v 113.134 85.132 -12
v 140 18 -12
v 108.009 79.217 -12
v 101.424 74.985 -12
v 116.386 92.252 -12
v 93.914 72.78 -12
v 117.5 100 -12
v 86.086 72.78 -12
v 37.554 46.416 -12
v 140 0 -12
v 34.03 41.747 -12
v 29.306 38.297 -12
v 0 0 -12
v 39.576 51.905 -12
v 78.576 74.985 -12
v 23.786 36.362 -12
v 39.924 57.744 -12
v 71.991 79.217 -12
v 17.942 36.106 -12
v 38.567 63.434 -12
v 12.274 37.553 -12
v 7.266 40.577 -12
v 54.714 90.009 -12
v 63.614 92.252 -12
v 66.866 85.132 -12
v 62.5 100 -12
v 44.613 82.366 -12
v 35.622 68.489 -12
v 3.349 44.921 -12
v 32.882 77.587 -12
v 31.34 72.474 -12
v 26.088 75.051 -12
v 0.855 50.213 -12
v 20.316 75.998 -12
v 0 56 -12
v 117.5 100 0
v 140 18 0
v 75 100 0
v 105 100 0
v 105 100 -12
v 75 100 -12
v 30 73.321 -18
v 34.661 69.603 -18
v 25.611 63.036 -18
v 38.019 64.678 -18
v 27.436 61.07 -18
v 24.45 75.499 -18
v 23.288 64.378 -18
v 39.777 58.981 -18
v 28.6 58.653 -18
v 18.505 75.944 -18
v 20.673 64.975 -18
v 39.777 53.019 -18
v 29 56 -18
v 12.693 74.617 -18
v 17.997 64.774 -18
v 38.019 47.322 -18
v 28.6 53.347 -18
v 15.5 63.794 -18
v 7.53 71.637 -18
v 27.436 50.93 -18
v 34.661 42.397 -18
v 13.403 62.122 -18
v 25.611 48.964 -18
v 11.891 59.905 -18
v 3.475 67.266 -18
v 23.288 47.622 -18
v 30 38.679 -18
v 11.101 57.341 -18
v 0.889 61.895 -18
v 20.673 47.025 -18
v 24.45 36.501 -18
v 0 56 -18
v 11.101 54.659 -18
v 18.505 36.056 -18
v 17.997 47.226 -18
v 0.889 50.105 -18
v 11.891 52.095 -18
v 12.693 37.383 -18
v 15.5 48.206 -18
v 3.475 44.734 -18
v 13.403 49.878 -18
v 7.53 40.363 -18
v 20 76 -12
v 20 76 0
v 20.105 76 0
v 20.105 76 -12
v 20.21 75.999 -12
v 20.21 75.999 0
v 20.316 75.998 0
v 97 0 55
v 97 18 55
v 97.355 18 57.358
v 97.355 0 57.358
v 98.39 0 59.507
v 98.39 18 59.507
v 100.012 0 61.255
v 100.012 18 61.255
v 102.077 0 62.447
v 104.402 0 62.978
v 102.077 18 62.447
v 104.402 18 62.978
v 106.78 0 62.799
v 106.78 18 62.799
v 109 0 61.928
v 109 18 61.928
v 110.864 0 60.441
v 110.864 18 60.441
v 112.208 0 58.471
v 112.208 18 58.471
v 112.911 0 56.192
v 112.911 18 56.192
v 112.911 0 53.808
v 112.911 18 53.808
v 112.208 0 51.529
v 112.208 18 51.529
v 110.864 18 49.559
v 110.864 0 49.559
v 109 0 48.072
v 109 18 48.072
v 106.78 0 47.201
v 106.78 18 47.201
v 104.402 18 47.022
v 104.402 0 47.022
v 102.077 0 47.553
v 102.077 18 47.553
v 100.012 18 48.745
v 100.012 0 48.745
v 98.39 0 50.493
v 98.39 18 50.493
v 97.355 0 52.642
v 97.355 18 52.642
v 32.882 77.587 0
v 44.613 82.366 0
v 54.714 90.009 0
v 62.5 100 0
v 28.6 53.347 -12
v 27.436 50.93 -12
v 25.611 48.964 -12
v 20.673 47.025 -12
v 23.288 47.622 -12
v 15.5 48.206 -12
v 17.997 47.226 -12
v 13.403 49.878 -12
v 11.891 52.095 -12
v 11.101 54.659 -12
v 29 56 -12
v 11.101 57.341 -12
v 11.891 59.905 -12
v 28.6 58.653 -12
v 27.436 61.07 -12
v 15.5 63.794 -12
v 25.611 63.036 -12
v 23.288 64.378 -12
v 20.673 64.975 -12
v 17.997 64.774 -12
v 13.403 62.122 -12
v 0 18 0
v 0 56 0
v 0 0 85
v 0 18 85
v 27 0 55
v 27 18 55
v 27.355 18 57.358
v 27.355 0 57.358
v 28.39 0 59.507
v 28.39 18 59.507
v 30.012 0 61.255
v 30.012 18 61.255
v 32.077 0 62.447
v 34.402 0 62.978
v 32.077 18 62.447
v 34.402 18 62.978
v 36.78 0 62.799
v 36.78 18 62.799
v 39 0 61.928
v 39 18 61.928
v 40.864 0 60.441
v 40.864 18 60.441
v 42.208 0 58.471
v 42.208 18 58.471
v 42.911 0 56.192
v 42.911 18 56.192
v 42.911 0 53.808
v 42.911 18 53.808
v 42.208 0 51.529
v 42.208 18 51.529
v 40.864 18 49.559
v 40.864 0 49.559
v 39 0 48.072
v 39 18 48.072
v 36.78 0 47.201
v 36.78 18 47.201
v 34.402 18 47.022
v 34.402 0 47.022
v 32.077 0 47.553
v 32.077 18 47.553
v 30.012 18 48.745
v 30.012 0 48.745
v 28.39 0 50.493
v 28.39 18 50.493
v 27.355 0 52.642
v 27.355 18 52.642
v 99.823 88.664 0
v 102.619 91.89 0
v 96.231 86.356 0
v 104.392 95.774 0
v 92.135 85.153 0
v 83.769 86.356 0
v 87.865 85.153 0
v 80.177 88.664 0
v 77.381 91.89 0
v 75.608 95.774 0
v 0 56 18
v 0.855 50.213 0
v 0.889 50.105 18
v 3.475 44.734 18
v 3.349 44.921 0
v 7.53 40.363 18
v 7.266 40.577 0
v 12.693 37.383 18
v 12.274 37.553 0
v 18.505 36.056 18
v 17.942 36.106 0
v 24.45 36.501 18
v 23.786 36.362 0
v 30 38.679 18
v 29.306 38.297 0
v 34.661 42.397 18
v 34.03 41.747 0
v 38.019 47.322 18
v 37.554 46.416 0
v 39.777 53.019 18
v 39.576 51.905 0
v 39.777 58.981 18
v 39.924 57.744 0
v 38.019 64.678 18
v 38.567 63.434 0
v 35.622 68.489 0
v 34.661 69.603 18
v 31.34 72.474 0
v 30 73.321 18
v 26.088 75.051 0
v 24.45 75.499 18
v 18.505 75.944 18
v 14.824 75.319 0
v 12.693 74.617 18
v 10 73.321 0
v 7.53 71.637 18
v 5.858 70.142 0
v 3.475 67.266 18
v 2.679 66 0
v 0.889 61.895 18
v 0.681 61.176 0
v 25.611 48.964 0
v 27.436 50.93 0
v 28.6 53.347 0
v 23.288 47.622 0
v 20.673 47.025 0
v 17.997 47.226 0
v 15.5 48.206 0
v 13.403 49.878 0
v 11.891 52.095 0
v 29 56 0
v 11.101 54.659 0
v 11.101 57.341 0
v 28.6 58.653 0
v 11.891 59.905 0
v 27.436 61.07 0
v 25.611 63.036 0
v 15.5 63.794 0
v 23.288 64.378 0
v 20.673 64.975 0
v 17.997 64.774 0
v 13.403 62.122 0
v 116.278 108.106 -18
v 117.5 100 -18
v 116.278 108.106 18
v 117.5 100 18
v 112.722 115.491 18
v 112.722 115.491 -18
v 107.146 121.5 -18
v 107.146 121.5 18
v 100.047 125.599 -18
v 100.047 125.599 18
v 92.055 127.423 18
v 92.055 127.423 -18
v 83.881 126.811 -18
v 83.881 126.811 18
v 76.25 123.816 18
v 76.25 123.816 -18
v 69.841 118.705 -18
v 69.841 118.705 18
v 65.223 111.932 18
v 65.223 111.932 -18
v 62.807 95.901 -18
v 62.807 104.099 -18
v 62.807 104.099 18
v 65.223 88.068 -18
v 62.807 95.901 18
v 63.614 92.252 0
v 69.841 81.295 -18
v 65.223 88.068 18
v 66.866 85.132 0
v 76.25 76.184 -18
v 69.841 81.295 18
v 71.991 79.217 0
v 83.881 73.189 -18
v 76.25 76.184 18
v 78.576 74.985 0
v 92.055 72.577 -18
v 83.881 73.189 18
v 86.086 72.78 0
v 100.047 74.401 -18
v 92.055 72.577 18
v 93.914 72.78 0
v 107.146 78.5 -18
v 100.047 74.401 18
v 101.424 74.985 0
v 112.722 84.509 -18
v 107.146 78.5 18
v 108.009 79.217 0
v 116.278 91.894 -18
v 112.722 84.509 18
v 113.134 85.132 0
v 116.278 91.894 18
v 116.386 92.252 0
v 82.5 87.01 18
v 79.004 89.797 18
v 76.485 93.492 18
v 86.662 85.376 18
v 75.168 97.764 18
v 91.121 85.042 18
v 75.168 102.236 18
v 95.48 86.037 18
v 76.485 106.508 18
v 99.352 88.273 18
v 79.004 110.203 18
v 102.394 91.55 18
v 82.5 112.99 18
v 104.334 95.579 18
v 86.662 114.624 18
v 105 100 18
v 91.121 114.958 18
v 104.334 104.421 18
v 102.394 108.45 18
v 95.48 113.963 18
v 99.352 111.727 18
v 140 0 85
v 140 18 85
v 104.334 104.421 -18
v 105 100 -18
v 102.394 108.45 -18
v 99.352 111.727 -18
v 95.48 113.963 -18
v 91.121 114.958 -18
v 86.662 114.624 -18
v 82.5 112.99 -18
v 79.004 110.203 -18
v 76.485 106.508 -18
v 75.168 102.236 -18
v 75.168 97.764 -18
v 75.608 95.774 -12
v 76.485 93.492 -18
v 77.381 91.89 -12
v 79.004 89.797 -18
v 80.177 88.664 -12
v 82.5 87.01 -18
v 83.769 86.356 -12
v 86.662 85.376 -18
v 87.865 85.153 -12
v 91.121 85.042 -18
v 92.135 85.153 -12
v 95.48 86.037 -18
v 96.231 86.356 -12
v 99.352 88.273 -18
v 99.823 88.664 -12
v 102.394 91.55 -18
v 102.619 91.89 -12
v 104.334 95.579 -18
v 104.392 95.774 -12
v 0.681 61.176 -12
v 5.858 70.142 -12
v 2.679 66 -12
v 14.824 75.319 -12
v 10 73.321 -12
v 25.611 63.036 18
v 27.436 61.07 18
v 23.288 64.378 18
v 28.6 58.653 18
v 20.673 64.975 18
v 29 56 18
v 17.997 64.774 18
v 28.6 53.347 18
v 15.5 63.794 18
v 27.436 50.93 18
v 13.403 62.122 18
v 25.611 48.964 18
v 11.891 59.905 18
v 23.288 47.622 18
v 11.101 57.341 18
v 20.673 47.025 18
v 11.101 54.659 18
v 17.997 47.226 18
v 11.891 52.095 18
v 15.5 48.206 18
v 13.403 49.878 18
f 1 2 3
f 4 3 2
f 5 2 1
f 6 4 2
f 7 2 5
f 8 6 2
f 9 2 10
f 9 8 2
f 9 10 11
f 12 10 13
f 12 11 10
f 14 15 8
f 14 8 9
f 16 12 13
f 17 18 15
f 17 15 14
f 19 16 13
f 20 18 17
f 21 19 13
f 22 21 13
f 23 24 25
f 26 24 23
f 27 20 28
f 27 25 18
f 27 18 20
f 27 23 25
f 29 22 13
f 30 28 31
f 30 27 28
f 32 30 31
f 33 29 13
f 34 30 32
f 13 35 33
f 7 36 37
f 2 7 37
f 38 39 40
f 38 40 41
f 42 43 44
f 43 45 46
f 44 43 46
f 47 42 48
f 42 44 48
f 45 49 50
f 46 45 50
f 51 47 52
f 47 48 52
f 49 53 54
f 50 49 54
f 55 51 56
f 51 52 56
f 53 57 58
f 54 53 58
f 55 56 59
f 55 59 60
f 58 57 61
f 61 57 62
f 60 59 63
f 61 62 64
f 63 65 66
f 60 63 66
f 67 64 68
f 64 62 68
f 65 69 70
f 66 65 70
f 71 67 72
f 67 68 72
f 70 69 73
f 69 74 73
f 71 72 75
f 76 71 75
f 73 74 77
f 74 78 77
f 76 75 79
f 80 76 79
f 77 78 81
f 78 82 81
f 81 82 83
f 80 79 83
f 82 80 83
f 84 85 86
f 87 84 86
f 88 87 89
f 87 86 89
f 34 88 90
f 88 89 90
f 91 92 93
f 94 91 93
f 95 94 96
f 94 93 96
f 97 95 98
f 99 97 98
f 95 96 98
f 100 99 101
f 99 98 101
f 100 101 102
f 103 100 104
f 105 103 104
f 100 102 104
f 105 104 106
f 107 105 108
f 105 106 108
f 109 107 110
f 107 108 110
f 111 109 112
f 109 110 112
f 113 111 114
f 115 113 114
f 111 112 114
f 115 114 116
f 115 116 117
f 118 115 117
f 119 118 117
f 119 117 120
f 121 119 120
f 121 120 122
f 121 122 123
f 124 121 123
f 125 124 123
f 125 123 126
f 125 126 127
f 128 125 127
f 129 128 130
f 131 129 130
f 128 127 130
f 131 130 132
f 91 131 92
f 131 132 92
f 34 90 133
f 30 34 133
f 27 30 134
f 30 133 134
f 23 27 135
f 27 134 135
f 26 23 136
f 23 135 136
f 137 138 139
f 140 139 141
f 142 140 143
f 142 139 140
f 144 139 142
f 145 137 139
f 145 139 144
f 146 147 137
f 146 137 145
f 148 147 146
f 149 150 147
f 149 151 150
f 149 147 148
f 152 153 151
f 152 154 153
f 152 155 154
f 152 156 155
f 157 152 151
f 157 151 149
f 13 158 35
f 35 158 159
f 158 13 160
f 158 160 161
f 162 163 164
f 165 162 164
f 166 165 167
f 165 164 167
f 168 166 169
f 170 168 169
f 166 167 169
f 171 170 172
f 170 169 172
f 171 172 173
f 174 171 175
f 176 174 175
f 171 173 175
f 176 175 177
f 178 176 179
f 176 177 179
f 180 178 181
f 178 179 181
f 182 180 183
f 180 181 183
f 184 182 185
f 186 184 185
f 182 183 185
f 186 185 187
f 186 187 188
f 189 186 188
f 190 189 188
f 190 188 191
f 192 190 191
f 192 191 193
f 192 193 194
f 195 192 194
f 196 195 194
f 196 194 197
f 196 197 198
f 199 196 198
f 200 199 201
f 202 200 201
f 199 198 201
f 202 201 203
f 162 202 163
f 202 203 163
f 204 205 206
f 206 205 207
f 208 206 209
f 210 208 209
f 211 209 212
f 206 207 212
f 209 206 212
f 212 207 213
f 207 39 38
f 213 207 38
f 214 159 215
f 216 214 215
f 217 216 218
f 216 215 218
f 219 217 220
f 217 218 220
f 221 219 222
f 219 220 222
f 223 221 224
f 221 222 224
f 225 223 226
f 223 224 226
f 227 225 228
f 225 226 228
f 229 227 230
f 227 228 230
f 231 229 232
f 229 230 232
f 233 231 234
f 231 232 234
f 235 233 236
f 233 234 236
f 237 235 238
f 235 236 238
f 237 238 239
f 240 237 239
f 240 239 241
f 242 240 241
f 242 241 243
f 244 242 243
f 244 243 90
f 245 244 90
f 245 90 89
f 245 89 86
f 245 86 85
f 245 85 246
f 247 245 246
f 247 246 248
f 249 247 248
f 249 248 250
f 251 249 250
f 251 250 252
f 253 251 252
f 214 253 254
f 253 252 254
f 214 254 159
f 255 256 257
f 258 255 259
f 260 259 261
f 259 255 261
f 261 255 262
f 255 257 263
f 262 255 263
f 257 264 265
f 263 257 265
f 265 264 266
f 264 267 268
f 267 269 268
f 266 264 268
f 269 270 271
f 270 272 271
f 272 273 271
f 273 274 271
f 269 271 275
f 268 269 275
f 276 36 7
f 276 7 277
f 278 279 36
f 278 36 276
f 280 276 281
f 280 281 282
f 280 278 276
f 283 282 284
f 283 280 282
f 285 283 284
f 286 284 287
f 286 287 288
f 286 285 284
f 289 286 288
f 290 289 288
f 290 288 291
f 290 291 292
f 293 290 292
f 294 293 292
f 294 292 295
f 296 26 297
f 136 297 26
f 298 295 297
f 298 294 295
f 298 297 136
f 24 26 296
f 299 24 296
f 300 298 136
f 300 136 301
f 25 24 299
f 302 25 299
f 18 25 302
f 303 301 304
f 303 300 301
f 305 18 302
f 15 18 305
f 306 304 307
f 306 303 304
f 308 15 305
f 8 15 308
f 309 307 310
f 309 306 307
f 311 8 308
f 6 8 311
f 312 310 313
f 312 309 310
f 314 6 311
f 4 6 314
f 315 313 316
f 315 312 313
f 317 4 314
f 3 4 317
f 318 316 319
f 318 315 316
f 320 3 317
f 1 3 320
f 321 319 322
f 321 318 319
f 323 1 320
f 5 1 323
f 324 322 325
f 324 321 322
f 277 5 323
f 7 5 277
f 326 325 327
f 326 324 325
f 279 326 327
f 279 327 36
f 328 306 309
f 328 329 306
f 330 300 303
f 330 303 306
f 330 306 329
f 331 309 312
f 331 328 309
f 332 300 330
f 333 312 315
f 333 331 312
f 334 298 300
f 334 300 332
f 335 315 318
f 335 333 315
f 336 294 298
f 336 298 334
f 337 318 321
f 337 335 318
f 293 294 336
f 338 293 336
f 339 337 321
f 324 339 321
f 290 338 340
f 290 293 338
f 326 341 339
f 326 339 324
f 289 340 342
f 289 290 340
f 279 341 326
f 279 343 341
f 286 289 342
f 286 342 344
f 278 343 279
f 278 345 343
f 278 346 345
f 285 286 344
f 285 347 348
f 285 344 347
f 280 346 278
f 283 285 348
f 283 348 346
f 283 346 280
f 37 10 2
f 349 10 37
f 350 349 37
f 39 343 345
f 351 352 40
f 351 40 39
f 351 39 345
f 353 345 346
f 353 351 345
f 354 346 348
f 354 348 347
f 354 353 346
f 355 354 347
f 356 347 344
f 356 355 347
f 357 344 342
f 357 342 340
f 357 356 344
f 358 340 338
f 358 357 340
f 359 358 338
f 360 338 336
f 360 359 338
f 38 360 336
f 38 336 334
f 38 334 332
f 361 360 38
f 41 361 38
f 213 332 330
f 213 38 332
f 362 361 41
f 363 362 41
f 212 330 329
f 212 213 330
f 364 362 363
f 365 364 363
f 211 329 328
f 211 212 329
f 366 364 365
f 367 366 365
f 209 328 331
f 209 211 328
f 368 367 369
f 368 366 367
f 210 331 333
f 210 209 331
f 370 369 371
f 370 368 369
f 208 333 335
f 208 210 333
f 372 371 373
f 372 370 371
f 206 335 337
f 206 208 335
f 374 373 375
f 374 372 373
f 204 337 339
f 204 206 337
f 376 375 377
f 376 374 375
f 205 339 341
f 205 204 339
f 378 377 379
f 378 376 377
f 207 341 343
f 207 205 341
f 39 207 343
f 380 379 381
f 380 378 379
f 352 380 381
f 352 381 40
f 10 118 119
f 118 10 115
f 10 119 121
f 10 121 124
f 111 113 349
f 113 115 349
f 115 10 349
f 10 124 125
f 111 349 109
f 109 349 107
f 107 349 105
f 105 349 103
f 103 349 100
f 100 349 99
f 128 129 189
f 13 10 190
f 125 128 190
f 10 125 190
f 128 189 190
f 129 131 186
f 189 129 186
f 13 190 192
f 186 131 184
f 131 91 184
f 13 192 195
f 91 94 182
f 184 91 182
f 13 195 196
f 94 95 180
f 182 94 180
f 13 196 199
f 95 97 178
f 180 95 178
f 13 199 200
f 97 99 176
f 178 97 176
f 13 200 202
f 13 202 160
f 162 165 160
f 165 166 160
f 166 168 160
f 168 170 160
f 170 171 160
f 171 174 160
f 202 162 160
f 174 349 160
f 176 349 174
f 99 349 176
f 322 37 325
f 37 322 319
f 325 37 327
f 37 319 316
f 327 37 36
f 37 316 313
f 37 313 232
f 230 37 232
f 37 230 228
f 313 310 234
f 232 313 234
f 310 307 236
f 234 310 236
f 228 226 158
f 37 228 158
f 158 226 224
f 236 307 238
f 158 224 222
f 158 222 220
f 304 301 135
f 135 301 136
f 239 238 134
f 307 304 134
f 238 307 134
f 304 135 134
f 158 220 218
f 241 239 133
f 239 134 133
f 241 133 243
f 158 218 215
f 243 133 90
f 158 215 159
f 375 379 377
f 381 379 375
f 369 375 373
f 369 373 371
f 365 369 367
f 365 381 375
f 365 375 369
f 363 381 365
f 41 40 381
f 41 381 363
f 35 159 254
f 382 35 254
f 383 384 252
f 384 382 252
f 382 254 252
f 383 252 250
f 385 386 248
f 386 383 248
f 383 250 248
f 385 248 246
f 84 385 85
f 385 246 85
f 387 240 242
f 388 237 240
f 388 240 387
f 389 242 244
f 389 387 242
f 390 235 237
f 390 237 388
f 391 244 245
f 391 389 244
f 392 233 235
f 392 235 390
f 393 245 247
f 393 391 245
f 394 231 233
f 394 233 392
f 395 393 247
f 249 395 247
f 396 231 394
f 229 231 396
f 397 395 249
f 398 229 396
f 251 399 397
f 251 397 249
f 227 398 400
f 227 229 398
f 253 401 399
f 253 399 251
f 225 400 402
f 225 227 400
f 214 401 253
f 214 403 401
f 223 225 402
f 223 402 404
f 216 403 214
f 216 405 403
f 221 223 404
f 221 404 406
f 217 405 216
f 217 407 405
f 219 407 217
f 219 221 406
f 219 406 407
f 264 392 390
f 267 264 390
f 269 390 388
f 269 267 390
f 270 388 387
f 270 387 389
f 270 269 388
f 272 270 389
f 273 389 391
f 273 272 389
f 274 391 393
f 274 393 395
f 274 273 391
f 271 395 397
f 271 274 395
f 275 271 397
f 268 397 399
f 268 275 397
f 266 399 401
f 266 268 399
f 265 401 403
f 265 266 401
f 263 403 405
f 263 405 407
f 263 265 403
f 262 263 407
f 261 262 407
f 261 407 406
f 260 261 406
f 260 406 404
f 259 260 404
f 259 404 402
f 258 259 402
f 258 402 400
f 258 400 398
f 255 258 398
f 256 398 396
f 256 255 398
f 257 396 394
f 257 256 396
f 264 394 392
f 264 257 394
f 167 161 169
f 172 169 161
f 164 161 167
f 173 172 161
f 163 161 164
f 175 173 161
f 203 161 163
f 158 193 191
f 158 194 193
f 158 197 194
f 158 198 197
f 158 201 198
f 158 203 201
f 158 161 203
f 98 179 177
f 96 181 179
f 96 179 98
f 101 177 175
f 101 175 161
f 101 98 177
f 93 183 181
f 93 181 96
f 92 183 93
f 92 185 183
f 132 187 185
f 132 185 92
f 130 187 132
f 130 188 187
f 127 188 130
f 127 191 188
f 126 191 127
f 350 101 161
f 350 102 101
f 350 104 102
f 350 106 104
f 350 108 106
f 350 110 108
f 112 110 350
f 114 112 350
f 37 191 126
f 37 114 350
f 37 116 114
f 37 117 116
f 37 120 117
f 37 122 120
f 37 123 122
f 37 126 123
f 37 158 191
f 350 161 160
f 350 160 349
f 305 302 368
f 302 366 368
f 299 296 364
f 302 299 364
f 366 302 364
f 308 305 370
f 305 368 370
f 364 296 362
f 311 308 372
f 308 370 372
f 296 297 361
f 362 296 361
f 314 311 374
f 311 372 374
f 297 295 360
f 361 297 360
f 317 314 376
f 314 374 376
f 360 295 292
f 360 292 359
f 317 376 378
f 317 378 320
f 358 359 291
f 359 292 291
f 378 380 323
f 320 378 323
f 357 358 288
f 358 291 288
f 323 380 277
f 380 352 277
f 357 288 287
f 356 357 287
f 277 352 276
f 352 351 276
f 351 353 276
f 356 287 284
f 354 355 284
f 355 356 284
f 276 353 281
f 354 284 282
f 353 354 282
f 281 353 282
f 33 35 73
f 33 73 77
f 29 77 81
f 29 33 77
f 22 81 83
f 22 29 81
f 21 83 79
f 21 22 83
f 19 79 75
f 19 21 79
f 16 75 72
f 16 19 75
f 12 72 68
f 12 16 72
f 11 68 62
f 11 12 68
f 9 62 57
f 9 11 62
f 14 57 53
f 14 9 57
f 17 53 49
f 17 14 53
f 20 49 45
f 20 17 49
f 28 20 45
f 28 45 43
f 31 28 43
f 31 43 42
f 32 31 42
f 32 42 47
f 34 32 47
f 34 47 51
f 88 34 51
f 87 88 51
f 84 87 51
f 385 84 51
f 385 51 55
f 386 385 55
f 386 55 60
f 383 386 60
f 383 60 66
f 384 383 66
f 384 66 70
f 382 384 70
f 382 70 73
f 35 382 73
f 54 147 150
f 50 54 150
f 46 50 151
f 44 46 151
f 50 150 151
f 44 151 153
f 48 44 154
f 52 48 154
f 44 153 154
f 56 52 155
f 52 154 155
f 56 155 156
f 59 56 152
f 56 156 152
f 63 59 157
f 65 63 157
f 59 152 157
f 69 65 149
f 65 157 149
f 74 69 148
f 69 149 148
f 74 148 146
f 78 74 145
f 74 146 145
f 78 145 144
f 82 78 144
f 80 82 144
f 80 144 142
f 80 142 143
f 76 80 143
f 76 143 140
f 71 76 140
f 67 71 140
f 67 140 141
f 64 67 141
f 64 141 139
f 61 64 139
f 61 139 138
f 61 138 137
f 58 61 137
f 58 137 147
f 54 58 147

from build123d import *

# Parameters (mm, degrees)
SKETCH1_W           = 140
SKETCH1_H           = 18
BOSS_EXTRUDE1_DEPTH = 85
SKETCH3_R           = 8
CUT_EXTRUDE2_DEPTH  = 18
SKETCH5_W           = 140
SKETCH5_H           = 100
BOSS_EXTRUDE5_DEPTH = 12
SKETCH8_R           = 20
SKETCH8_R_2         = 9
SKETCH8_R_3         = 27.5
SKETCH8_R_4         = 15
BOSS_EXTRUDE6_DEPTH = 18
CUT_EXTRUDE3_DEPTH  = 12


with BuildPart() as part:
    # Sketch1 → Boss-Extrude1 (new body)
    with BuildSketch(Plane.XY):
        with Locations((70, 9)):
            Rectangle(SKETCH1_W, SKETCH1_H)
    extrude(amount=BOSS_EXTRUDE1_DEPTH)

    # Sketch3 → Cut-Extrude2 (cut)
    with BuildSketch(Plane(origin=(0, 18, 0), x_dir=(1, 0, 0), z_dir=(0, 1, 0))):
        with Locations(Location((35, -55, 0), (0, 0, 180))):
            Circle(SKETCH3_R)
        with Locations(Location((105, -55, 0), (0, 0, 180))):
            Circle(SKETCH3_R)
    extrude(amount=-CUT_EXTRUDE2_DEPTH, mode=Mode.SUBTRACT)

    # Sketch5 → Boss-Extrude5 (add)
    with BuildSketch(Plane(origin=(0, 0, 0), x_dir=(-1, 0, 0), z_dir=(0, 0, -1))):
        with Locations((-70, 50)):
            Rectangle(SKETCH5_W, SKETCH5_H)
    extrude(amount=BOSS_EXTRUDE5_DEPTH)

    # Sketch8 → Boss-Extrude6 (add, symmetric)
    # profile 1 of 2: a face of its own
    with BuildSketch(Plane.XY):
        with Locations(Location((20, 56, 0), (0, 0, 180))):
            Circle(SKETCH8_R)
        with Locations((20, 56)):
            Circle(SKETCH8_R_2, mode=Mode.SUBTRACT)
    # profile 2 of 2: a face of its own
    with BuildSketch(Plane.XY):
        with Locations((90, 100)):
            Circle(SKETCH8_R_3)
        with Locations((90, 100)):
            Circle(SKETCH8_R_4, mode=Mode.SUBTRACT)
    extrude(amount=BOSS_EXTRUDE6_DEPTH, both=True)

    # Sketch10 → Cut-Extrude3 (cut)
    with BuildSketch(Plane.XY):
        Polygon((117.5, 100), (140, 18), (140, 100), align=None)
        with BuildLine():
            ThreePointArc((20.315557315, 75.997510435), (44.612918998, 82.365712085), (62.5, 100))
            Line((62.5, 100), (0, 100))
            Line((0, 100), (0, 56))
            ThreePointArc((0, 56), (5.857864376, 70.142135624), (20, 76))
            ThreePointArc((20, 76), (20.157783568, 75.999377599), (20.315557315, 75.997510435))
        make_face()
    extrude(amount=-CUT_EXTRUDE3_DEPTH, mode=Mode.SUBTRACT)


solid = part.part
